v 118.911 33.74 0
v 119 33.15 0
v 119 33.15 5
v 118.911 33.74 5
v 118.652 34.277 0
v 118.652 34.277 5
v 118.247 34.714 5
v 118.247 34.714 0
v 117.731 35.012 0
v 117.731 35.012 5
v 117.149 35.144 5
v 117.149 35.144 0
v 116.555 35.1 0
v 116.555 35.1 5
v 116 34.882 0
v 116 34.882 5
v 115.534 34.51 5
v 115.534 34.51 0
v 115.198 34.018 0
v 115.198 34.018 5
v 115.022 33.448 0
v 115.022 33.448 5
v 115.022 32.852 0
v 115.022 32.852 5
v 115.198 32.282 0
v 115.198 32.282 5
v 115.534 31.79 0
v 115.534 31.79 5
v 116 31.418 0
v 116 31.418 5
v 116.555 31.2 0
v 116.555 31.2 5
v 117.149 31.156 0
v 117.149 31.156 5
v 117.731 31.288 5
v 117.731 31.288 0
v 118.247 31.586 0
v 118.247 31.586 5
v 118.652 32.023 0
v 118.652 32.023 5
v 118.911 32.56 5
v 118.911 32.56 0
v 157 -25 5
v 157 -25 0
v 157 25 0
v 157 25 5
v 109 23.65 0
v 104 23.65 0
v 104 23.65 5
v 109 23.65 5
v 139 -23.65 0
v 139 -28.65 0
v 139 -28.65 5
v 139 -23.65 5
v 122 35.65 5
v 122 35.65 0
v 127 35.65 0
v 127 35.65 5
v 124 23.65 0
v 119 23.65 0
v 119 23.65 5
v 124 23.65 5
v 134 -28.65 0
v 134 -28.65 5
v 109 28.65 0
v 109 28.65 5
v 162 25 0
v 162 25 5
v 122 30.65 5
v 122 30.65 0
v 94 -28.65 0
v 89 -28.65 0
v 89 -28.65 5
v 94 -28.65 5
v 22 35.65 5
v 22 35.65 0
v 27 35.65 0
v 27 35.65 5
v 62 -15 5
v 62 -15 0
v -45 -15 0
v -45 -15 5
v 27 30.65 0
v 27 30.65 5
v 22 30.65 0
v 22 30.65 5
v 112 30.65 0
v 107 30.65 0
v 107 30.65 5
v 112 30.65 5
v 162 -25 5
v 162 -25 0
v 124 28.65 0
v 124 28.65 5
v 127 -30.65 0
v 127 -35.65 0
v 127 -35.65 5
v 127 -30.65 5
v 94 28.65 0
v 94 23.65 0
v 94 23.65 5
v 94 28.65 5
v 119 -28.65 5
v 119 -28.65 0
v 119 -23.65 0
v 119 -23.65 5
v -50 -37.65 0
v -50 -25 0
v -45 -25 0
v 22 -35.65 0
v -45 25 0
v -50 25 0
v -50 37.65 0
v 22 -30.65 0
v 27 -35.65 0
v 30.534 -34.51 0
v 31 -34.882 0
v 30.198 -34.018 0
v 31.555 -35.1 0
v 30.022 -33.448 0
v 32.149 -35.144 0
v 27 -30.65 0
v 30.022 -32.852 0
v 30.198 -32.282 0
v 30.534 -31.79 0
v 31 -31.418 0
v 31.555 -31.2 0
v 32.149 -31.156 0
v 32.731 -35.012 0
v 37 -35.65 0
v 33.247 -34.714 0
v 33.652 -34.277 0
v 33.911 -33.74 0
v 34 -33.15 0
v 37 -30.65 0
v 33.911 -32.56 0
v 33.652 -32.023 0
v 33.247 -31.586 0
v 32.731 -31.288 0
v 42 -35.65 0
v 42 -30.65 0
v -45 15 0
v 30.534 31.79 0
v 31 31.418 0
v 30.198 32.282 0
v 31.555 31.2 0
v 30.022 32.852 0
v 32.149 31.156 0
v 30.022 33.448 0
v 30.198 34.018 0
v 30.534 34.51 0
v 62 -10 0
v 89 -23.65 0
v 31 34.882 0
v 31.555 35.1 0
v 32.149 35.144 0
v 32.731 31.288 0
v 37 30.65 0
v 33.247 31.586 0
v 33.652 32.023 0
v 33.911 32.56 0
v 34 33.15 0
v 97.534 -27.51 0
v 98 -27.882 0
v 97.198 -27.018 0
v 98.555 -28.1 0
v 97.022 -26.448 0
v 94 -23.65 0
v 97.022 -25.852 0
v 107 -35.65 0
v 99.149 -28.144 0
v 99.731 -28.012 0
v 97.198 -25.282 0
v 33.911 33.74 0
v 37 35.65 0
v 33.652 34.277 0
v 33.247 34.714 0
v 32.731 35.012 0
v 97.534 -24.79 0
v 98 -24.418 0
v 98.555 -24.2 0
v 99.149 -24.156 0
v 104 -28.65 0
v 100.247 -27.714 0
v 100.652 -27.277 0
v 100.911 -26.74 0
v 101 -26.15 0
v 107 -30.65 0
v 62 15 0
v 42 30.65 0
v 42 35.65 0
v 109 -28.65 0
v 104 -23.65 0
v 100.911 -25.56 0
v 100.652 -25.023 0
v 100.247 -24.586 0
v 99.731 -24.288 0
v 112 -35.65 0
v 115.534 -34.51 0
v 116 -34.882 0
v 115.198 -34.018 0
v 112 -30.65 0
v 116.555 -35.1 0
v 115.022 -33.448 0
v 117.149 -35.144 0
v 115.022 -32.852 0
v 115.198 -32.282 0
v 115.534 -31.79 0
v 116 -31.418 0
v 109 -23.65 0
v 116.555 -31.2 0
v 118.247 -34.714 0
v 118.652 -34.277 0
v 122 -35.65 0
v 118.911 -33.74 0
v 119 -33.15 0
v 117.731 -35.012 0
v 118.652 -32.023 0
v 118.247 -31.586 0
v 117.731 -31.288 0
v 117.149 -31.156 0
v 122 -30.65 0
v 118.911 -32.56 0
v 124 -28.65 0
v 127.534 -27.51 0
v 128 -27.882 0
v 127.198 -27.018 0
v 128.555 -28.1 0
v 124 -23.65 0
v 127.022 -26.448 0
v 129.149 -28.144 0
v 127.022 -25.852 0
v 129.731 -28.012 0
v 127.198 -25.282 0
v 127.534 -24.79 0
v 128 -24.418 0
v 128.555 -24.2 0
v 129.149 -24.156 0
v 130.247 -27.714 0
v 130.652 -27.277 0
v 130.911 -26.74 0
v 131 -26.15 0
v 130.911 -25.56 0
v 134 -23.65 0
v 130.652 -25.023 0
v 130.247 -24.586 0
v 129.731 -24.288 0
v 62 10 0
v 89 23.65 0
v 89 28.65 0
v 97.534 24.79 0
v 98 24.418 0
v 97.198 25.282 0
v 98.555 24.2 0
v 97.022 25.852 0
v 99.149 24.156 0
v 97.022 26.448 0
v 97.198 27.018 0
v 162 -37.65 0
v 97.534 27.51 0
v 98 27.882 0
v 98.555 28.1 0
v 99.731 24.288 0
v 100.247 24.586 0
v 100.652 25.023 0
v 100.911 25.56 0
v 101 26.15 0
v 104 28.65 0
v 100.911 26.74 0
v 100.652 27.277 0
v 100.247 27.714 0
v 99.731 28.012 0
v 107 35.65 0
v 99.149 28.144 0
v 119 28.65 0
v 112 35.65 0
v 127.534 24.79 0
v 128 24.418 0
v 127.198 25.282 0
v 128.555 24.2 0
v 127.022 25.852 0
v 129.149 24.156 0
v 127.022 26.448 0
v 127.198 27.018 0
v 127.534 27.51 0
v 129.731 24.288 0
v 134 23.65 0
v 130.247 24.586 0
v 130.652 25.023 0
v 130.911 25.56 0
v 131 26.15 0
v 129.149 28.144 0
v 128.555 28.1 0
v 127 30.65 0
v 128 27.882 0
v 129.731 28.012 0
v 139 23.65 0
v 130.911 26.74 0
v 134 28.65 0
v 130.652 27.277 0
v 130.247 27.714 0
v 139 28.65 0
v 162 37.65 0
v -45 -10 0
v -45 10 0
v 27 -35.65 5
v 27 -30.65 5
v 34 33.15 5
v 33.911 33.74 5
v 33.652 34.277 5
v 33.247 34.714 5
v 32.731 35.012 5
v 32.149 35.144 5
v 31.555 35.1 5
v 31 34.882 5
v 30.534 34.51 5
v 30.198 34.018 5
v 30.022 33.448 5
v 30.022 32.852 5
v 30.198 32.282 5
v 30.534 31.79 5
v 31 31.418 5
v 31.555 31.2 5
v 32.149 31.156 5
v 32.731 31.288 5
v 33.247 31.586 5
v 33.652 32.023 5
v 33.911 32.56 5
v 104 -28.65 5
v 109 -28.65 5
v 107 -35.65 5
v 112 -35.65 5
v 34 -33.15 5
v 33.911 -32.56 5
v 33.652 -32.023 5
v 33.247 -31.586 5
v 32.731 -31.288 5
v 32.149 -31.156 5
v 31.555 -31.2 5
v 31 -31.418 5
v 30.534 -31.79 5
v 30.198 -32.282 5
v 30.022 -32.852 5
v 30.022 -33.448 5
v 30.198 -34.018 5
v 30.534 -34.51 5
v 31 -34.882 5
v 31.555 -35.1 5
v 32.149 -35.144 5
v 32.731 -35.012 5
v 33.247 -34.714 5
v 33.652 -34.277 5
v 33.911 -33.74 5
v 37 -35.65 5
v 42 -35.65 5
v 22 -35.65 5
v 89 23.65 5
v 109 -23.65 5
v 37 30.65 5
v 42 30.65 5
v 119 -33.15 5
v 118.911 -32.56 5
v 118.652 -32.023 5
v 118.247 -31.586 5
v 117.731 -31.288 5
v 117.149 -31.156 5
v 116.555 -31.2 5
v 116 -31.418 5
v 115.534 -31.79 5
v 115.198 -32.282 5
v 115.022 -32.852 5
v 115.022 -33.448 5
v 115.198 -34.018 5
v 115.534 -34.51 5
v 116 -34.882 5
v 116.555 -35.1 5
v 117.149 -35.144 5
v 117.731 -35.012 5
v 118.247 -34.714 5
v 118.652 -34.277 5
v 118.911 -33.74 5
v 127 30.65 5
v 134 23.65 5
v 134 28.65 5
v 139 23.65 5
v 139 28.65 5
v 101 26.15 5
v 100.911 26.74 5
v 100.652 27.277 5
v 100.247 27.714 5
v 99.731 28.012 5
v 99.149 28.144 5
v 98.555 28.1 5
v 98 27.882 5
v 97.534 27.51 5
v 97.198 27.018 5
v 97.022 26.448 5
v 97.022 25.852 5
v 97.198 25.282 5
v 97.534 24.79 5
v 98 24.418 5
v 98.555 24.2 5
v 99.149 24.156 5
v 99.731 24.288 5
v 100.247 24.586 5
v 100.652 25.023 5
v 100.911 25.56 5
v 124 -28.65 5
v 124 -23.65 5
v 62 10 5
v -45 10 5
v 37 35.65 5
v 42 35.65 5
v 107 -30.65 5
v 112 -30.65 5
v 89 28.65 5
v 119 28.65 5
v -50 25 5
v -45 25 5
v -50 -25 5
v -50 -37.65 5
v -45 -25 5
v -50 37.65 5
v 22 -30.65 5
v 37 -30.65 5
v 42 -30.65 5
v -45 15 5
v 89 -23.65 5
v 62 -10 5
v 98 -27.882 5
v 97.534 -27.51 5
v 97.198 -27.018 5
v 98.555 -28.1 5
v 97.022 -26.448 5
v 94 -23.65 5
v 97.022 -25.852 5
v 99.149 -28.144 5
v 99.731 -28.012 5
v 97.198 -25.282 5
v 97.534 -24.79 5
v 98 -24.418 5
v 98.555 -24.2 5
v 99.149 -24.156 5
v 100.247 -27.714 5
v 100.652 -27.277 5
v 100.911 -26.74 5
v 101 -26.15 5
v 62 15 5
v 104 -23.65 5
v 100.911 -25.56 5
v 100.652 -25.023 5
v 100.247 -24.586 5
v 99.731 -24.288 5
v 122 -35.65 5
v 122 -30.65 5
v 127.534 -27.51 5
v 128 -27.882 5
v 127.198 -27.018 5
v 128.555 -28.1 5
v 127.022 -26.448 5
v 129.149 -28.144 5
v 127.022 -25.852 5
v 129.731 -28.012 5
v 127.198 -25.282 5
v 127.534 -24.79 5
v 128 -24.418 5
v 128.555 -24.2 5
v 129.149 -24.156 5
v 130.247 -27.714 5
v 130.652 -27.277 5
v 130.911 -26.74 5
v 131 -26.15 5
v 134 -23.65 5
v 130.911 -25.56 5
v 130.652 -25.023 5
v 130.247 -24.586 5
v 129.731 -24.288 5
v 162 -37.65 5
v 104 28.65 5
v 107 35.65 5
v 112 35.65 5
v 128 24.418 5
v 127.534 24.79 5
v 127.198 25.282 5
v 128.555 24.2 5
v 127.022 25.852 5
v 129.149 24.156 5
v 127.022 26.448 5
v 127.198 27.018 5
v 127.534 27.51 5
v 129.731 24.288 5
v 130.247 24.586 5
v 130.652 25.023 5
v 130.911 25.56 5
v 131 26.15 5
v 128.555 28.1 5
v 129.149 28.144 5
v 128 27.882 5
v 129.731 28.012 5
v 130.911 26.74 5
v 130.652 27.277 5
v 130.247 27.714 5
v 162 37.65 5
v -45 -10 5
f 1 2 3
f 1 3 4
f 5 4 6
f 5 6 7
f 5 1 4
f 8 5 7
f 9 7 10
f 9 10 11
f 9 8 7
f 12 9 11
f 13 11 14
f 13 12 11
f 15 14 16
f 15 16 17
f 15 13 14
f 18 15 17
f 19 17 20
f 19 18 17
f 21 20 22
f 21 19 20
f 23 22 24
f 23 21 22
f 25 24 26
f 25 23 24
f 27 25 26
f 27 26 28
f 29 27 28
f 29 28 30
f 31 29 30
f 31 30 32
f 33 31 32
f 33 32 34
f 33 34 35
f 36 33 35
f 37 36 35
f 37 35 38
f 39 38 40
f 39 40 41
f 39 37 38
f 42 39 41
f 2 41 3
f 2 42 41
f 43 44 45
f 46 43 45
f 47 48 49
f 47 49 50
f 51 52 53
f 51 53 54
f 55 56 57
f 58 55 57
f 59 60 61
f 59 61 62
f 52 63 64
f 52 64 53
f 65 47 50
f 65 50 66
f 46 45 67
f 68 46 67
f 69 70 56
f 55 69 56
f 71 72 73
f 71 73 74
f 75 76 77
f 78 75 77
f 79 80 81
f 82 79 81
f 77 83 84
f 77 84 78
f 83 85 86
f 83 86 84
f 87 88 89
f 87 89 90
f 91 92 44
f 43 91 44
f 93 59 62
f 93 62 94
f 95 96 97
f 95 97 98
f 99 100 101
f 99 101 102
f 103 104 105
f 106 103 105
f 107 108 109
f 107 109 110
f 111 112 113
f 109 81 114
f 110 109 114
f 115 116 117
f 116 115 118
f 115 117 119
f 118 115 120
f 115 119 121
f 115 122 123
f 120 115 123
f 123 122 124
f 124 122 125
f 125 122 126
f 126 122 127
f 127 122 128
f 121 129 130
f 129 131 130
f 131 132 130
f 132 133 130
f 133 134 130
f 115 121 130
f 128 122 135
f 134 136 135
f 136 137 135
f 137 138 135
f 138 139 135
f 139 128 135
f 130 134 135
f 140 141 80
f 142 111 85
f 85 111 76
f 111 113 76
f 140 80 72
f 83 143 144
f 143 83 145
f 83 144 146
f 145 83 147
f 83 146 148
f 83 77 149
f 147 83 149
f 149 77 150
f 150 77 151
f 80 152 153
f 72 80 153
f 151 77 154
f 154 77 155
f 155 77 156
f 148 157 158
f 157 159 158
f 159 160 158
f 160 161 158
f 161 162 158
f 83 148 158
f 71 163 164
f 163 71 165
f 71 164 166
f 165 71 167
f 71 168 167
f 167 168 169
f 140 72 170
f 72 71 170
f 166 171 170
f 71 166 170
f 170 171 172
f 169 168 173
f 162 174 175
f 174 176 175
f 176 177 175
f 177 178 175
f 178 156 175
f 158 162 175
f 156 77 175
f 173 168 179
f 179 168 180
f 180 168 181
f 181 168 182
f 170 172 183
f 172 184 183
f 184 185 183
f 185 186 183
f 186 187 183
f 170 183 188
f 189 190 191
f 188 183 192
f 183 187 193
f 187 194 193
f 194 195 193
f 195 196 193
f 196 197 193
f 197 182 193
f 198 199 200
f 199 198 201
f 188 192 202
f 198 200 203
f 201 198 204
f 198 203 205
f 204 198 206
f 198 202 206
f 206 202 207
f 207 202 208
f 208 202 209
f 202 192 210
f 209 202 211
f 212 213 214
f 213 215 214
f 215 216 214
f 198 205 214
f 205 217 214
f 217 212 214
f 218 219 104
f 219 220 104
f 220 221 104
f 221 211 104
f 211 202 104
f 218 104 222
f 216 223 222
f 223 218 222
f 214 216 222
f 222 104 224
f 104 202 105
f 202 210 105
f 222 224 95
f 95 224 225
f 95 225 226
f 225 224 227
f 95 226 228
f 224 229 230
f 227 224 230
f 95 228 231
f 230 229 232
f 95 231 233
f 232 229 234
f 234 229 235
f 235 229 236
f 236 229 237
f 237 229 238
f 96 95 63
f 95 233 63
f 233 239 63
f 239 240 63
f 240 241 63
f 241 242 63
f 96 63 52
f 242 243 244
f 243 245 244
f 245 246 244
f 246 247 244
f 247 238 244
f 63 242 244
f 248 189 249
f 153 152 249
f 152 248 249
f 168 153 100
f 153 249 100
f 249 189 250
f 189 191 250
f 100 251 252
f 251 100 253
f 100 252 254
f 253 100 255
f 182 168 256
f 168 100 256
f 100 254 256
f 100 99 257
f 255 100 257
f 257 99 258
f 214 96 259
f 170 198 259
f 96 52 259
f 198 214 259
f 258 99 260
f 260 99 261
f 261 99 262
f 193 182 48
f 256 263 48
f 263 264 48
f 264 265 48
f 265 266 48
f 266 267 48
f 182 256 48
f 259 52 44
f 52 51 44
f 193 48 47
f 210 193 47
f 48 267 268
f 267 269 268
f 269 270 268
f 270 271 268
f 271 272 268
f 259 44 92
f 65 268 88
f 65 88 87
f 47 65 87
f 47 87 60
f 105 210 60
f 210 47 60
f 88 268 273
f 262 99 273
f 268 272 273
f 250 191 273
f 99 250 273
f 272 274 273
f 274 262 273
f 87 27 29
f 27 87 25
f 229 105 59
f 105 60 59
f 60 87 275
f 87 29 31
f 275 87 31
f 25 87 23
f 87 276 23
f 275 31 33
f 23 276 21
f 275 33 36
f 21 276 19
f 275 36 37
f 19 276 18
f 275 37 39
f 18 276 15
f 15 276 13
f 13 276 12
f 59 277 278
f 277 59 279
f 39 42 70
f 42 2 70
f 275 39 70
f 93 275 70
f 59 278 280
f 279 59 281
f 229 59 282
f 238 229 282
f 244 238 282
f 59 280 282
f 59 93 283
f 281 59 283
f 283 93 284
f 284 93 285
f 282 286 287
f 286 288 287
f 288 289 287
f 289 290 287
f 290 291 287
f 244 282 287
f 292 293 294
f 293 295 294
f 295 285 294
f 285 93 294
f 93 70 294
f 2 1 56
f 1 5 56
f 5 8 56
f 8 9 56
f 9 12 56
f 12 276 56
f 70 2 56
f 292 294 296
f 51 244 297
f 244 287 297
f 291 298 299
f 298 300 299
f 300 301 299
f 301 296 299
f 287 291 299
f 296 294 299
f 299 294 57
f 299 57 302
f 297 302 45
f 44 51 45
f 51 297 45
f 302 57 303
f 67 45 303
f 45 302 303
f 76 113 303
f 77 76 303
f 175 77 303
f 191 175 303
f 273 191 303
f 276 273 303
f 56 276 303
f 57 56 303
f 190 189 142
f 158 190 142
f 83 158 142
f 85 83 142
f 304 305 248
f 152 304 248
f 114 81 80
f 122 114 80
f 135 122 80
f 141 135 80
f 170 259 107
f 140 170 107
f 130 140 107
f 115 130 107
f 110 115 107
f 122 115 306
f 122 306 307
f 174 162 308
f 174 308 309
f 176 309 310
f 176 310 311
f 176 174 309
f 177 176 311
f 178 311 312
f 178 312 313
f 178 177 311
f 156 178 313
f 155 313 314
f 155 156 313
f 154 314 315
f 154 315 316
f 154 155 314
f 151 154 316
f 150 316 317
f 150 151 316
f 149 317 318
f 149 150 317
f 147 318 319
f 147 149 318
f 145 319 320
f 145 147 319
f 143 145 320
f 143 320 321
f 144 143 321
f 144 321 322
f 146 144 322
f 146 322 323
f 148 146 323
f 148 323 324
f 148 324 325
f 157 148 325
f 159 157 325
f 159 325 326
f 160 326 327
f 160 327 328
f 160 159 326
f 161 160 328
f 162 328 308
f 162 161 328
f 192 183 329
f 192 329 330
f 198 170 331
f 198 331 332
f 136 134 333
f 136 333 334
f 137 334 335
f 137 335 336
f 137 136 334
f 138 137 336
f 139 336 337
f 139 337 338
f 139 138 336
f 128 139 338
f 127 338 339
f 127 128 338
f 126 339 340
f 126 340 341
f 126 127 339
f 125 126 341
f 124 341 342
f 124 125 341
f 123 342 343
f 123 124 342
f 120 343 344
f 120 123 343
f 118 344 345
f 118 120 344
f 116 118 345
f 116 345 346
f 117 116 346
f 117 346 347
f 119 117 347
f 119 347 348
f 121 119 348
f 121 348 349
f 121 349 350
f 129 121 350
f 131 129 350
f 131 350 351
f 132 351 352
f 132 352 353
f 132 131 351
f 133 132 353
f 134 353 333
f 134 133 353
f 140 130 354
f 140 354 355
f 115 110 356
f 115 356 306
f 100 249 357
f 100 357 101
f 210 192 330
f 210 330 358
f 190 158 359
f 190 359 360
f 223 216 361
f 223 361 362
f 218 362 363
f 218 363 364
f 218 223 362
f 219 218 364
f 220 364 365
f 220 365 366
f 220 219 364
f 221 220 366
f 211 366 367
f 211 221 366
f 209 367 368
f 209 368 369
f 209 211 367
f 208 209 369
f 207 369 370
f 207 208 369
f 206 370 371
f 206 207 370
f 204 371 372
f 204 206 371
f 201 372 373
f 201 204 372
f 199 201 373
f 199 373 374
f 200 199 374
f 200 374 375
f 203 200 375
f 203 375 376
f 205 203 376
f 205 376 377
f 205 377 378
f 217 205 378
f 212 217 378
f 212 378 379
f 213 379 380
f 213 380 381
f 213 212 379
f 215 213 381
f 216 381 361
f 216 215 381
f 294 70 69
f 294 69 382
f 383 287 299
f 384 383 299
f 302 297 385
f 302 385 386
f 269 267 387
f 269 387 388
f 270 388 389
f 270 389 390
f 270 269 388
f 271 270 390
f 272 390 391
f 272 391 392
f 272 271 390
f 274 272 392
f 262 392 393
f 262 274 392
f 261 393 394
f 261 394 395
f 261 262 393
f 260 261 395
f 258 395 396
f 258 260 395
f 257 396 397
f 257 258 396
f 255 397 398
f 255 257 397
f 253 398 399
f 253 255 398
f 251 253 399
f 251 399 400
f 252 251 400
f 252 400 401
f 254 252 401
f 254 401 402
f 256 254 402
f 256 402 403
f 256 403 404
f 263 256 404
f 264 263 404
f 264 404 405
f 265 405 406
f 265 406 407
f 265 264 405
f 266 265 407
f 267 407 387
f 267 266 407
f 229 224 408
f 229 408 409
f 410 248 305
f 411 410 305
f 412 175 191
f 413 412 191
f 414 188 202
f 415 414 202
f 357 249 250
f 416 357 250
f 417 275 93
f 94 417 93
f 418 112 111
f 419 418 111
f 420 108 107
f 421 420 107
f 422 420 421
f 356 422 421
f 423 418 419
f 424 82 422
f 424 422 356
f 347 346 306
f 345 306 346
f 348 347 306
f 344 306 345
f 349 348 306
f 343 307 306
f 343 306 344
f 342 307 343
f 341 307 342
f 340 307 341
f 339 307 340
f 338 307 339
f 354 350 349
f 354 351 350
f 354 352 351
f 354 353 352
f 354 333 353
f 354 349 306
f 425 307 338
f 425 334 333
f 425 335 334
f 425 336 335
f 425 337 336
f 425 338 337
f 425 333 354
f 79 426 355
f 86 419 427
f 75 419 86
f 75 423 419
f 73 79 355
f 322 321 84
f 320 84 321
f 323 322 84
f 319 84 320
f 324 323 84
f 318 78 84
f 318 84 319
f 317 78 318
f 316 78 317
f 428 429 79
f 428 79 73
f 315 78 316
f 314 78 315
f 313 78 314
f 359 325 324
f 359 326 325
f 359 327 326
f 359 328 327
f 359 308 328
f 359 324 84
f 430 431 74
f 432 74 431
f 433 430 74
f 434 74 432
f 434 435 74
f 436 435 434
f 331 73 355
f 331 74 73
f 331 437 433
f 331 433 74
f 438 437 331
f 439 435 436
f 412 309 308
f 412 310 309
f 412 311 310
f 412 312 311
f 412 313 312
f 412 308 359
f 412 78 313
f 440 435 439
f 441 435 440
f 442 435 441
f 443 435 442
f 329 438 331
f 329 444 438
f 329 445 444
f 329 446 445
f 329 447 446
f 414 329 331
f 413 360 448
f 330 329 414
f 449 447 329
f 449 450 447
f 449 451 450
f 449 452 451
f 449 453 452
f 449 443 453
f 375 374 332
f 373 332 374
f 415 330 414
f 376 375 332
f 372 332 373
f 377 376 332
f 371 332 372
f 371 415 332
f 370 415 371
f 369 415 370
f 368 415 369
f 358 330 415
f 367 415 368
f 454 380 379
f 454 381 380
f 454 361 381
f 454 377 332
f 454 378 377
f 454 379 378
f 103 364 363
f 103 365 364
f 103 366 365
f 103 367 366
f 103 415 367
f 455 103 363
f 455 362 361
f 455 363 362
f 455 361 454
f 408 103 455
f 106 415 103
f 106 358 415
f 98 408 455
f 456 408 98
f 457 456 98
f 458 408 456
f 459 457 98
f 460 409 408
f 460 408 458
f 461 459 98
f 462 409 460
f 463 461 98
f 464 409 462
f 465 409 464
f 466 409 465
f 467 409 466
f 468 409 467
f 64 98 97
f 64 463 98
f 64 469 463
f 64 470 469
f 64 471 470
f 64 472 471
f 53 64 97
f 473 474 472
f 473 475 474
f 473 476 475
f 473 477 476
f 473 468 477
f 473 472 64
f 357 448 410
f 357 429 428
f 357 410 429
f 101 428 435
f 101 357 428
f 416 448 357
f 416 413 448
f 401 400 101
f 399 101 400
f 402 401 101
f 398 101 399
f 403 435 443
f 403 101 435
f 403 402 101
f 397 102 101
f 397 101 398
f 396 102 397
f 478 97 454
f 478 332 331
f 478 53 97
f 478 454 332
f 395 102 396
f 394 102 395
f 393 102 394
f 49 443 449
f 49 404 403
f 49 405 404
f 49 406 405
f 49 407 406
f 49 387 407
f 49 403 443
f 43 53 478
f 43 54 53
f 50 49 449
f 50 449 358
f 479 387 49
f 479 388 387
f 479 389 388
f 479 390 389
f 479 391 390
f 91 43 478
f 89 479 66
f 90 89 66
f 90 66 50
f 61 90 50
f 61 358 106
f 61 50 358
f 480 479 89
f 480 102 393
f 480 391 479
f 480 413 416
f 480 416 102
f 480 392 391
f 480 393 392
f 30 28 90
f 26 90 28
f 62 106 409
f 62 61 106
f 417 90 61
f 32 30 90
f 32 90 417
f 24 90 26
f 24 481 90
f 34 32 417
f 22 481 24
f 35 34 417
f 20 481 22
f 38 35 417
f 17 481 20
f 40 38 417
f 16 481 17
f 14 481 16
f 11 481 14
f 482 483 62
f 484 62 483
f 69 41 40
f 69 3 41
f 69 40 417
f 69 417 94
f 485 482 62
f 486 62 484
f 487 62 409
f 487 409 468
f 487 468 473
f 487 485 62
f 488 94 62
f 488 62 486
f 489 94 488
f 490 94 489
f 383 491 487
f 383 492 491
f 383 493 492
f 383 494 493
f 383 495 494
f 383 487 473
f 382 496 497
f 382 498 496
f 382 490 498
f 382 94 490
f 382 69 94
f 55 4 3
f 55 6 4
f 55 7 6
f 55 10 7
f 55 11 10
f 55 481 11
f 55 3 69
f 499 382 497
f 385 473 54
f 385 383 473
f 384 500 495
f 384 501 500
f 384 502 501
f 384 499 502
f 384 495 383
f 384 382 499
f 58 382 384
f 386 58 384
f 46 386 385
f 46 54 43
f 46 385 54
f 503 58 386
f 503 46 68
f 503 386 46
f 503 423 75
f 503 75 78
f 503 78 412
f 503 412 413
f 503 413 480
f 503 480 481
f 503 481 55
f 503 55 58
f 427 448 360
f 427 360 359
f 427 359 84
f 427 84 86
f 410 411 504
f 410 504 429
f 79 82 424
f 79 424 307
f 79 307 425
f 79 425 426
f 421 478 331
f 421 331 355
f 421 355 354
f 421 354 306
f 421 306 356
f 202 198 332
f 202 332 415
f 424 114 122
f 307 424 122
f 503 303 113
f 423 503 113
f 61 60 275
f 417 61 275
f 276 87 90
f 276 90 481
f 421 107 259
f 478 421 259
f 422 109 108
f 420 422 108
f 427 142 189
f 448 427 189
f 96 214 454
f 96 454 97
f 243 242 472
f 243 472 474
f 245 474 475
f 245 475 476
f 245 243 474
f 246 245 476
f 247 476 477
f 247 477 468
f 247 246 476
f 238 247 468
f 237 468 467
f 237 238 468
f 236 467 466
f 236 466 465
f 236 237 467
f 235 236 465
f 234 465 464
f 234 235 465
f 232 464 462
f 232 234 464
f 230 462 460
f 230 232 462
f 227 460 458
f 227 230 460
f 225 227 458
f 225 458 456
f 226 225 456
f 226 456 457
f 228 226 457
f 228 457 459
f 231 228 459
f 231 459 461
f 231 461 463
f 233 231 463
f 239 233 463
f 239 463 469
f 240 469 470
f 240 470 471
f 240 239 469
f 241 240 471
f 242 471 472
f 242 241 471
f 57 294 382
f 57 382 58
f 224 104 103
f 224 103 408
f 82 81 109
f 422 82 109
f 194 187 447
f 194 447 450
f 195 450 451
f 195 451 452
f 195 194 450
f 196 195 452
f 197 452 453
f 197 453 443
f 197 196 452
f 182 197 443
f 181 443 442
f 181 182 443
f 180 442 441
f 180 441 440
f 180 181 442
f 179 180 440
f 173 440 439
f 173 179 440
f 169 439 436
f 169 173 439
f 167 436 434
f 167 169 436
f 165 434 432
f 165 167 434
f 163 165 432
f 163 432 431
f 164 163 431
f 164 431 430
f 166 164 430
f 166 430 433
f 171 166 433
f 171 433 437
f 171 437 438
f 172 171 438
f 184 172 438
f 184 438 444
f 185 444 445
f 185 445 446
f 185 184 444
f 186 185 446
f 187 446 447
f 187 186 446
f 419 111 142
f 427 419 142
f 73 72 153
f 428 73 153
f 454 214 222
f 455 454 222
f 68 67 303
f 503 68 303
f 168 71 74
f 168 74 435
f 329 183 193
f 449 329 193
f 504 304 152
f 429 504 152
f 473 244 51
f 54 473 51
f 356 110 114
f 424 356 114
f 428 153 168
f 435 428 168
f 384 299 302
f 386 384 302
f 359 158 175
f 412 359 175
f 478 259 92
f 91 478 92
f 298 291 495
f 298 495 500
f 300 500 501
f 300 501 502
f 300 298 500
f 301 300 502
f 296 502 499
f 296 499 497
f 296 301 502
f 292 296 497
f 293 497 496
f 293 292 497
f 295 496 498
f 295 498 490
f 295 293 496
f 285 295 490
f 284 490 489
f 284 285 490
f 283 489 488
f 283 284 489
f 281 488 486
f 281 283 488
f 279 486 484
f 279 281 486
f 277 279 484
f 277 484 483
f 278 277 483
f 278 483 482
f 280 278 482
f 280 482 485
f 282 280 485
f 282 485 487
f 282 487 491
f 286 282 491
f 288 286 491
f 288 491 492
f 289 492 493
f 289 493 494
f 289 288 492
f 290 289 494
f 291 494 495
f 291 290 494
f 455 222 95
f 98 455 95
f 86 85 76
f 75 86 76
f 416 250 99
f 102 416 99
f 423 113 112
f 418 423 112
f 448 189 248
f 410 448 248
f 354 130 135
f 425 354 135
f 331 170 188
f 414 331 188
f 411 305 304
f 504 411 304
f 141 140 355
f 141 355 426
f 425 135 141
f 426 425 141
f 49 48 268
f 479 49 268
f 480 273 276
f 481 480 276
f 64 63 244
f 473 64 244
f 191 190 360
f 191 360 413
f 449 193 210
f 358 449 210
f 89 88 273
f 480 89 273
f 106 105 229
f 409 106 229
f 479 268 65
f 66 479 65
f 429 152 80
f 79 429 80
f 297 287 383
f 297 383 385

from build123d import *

# Parameters (mm, degrees)
ESQUISSE1_W        = 5
ESQUISSE1_H        = 5
ESQUISSE1_R        = 2
BOSS_EXTRU_1_DEPTH = 5


with BuildPart() as part:
    # Esquisse1 → Boss.-Extru.1 (new body)
    with BuildSketch(Plane.XY):
        Polygon((162, 37.65), (0, 37.65), (-50, 37.65), (-50, 25), (-45, 25), (-45, 15), (62, 15), (62, 10), (0, 10), (-45, 10), (-45, -10), (62, -10), (62, -15), (-45, -15), (-45, -25), (-50, -25), (-50, -37.65), (0, -37.65), (162, -37.65), (162, -25), (157, -25), (157, 25), (162, 25), align=None)
        with Locations((24.5, -33.15)):
            Rectangle(ESQUISSE1_W, ESQUISSE1_H, mode=Mode.SUBTRACT)
        with Locations((32, -33.15)):
            Circle(ESQUISSE1_R, mode=Mode.SUBTRACT)
        with Locations((39.5, -33.15)):
            Rectangle(ESQUISSE1_W, ESQUISSE1_H, mode=Mode.SUBTRACT)
        with Locations((91.5, -26.15)):
            Rectangle(ESQUISSE1_W, ESQUISSE1_H, mode=Mode.SUBTRACT)
        with Locations((99, -26.15)):
            Circle(ESQUISSE1_R, mode=Mode.SUBTRACT)
        with Locations((106.5, -26.15)):
            Rectangle(ESQUISSE1_W, ESQUISSE1_H, mode=Mode.SUBTRACT)
        with Locations((109.5, -33.15)):
            Rectangle(ESQUISSE1_W, ESQUISSE1_H, mode=Mode.SUBTRACT)
        with Locations((117, -33.15)):
            Circle(ESQUISSE1_R, mode=Mode.SUBTRACT)
        with Locations((124.5, -33.15)):
            Rectangle(ESQUISSE1_W, ESQUISSE1_H, mode=Mode.SUBTRACT)
        with Locations((121.5, -26.15)):
            Rectangle(ESQUISSE1_W, ESQUISSE1_H, mode=Mode.SUBTRACT)
        with Locations((129, -26.15)):
            Circle(ESQUISSE1_R, mode=Mode.SUBTRACT)
        with Locations((136.5, -26.15)):
            Rectangle(ESQUISSE1_W, ESQUISSE1_H, mode=Mode.SUBTRACT)
        with Locations((24.5, 33.15)):
            Rectangle(ESQUISSE1_W, ESQUISSE1_H, mode=Mode.SUBTRACT)
        with Locations((32, 33.15)):
            Circle(ESQUISSE1_R, mode=Mode.SUBTRACT)
        with Locations((39.5, 33.15)):
            Rectangle(ESQUISSE1_W, ESQUISSE1_H, mode=Mode.SUBTRACT)
        with Locations((91.5, 26.15)):
            Rectangle(ESQUISSE1_W, ESQUISSE1_H, mode=Mode.SUBTRACT)
        with Locations((99, 26.15)):
            Circle(ESQUISSE1_R, mode=Mode.SUBTRACT)
        with Locations((106.5, 26.15)):
            Rectangle(ESQUISSE1_W, ESQUISSE1_H, mode=Mode.SUBTRACT)
        with Locations((121.5, 26.15)):
            Rectangle(ESQUISSE1_W, ESQUISSE1_H, mode=Mode.SUBTRACT)
        with Locations((129, 26.15)):
            Circle(ESQUISSE1_R, mode=Mode.SUBTRACT)
        with Locations((136.5, 26.15)):
            Rectangle(ESQUISSE1_W, ESQUISSE1_H, mode=Mode.SUBTRACT)
        with Locations((109.5, 33.15)):
            Rectangle(ESQUISSE1_W, ESQUISSE1_H, mode=Mode.SUBTRACT)
        with Locations((117, 33.15)):
            Circle(ESQUISSE1_R, mode=Mode.SUBTRACT)
        with Locations((124.5, 33.15)):
            Rectangle(ESQUISSE1_W, ESQUISSE1_H, mode=Mode.SUBTRACT)
    extrude(amount=BOSS_EXTRU_1_DEPTH)


solid = part.part
